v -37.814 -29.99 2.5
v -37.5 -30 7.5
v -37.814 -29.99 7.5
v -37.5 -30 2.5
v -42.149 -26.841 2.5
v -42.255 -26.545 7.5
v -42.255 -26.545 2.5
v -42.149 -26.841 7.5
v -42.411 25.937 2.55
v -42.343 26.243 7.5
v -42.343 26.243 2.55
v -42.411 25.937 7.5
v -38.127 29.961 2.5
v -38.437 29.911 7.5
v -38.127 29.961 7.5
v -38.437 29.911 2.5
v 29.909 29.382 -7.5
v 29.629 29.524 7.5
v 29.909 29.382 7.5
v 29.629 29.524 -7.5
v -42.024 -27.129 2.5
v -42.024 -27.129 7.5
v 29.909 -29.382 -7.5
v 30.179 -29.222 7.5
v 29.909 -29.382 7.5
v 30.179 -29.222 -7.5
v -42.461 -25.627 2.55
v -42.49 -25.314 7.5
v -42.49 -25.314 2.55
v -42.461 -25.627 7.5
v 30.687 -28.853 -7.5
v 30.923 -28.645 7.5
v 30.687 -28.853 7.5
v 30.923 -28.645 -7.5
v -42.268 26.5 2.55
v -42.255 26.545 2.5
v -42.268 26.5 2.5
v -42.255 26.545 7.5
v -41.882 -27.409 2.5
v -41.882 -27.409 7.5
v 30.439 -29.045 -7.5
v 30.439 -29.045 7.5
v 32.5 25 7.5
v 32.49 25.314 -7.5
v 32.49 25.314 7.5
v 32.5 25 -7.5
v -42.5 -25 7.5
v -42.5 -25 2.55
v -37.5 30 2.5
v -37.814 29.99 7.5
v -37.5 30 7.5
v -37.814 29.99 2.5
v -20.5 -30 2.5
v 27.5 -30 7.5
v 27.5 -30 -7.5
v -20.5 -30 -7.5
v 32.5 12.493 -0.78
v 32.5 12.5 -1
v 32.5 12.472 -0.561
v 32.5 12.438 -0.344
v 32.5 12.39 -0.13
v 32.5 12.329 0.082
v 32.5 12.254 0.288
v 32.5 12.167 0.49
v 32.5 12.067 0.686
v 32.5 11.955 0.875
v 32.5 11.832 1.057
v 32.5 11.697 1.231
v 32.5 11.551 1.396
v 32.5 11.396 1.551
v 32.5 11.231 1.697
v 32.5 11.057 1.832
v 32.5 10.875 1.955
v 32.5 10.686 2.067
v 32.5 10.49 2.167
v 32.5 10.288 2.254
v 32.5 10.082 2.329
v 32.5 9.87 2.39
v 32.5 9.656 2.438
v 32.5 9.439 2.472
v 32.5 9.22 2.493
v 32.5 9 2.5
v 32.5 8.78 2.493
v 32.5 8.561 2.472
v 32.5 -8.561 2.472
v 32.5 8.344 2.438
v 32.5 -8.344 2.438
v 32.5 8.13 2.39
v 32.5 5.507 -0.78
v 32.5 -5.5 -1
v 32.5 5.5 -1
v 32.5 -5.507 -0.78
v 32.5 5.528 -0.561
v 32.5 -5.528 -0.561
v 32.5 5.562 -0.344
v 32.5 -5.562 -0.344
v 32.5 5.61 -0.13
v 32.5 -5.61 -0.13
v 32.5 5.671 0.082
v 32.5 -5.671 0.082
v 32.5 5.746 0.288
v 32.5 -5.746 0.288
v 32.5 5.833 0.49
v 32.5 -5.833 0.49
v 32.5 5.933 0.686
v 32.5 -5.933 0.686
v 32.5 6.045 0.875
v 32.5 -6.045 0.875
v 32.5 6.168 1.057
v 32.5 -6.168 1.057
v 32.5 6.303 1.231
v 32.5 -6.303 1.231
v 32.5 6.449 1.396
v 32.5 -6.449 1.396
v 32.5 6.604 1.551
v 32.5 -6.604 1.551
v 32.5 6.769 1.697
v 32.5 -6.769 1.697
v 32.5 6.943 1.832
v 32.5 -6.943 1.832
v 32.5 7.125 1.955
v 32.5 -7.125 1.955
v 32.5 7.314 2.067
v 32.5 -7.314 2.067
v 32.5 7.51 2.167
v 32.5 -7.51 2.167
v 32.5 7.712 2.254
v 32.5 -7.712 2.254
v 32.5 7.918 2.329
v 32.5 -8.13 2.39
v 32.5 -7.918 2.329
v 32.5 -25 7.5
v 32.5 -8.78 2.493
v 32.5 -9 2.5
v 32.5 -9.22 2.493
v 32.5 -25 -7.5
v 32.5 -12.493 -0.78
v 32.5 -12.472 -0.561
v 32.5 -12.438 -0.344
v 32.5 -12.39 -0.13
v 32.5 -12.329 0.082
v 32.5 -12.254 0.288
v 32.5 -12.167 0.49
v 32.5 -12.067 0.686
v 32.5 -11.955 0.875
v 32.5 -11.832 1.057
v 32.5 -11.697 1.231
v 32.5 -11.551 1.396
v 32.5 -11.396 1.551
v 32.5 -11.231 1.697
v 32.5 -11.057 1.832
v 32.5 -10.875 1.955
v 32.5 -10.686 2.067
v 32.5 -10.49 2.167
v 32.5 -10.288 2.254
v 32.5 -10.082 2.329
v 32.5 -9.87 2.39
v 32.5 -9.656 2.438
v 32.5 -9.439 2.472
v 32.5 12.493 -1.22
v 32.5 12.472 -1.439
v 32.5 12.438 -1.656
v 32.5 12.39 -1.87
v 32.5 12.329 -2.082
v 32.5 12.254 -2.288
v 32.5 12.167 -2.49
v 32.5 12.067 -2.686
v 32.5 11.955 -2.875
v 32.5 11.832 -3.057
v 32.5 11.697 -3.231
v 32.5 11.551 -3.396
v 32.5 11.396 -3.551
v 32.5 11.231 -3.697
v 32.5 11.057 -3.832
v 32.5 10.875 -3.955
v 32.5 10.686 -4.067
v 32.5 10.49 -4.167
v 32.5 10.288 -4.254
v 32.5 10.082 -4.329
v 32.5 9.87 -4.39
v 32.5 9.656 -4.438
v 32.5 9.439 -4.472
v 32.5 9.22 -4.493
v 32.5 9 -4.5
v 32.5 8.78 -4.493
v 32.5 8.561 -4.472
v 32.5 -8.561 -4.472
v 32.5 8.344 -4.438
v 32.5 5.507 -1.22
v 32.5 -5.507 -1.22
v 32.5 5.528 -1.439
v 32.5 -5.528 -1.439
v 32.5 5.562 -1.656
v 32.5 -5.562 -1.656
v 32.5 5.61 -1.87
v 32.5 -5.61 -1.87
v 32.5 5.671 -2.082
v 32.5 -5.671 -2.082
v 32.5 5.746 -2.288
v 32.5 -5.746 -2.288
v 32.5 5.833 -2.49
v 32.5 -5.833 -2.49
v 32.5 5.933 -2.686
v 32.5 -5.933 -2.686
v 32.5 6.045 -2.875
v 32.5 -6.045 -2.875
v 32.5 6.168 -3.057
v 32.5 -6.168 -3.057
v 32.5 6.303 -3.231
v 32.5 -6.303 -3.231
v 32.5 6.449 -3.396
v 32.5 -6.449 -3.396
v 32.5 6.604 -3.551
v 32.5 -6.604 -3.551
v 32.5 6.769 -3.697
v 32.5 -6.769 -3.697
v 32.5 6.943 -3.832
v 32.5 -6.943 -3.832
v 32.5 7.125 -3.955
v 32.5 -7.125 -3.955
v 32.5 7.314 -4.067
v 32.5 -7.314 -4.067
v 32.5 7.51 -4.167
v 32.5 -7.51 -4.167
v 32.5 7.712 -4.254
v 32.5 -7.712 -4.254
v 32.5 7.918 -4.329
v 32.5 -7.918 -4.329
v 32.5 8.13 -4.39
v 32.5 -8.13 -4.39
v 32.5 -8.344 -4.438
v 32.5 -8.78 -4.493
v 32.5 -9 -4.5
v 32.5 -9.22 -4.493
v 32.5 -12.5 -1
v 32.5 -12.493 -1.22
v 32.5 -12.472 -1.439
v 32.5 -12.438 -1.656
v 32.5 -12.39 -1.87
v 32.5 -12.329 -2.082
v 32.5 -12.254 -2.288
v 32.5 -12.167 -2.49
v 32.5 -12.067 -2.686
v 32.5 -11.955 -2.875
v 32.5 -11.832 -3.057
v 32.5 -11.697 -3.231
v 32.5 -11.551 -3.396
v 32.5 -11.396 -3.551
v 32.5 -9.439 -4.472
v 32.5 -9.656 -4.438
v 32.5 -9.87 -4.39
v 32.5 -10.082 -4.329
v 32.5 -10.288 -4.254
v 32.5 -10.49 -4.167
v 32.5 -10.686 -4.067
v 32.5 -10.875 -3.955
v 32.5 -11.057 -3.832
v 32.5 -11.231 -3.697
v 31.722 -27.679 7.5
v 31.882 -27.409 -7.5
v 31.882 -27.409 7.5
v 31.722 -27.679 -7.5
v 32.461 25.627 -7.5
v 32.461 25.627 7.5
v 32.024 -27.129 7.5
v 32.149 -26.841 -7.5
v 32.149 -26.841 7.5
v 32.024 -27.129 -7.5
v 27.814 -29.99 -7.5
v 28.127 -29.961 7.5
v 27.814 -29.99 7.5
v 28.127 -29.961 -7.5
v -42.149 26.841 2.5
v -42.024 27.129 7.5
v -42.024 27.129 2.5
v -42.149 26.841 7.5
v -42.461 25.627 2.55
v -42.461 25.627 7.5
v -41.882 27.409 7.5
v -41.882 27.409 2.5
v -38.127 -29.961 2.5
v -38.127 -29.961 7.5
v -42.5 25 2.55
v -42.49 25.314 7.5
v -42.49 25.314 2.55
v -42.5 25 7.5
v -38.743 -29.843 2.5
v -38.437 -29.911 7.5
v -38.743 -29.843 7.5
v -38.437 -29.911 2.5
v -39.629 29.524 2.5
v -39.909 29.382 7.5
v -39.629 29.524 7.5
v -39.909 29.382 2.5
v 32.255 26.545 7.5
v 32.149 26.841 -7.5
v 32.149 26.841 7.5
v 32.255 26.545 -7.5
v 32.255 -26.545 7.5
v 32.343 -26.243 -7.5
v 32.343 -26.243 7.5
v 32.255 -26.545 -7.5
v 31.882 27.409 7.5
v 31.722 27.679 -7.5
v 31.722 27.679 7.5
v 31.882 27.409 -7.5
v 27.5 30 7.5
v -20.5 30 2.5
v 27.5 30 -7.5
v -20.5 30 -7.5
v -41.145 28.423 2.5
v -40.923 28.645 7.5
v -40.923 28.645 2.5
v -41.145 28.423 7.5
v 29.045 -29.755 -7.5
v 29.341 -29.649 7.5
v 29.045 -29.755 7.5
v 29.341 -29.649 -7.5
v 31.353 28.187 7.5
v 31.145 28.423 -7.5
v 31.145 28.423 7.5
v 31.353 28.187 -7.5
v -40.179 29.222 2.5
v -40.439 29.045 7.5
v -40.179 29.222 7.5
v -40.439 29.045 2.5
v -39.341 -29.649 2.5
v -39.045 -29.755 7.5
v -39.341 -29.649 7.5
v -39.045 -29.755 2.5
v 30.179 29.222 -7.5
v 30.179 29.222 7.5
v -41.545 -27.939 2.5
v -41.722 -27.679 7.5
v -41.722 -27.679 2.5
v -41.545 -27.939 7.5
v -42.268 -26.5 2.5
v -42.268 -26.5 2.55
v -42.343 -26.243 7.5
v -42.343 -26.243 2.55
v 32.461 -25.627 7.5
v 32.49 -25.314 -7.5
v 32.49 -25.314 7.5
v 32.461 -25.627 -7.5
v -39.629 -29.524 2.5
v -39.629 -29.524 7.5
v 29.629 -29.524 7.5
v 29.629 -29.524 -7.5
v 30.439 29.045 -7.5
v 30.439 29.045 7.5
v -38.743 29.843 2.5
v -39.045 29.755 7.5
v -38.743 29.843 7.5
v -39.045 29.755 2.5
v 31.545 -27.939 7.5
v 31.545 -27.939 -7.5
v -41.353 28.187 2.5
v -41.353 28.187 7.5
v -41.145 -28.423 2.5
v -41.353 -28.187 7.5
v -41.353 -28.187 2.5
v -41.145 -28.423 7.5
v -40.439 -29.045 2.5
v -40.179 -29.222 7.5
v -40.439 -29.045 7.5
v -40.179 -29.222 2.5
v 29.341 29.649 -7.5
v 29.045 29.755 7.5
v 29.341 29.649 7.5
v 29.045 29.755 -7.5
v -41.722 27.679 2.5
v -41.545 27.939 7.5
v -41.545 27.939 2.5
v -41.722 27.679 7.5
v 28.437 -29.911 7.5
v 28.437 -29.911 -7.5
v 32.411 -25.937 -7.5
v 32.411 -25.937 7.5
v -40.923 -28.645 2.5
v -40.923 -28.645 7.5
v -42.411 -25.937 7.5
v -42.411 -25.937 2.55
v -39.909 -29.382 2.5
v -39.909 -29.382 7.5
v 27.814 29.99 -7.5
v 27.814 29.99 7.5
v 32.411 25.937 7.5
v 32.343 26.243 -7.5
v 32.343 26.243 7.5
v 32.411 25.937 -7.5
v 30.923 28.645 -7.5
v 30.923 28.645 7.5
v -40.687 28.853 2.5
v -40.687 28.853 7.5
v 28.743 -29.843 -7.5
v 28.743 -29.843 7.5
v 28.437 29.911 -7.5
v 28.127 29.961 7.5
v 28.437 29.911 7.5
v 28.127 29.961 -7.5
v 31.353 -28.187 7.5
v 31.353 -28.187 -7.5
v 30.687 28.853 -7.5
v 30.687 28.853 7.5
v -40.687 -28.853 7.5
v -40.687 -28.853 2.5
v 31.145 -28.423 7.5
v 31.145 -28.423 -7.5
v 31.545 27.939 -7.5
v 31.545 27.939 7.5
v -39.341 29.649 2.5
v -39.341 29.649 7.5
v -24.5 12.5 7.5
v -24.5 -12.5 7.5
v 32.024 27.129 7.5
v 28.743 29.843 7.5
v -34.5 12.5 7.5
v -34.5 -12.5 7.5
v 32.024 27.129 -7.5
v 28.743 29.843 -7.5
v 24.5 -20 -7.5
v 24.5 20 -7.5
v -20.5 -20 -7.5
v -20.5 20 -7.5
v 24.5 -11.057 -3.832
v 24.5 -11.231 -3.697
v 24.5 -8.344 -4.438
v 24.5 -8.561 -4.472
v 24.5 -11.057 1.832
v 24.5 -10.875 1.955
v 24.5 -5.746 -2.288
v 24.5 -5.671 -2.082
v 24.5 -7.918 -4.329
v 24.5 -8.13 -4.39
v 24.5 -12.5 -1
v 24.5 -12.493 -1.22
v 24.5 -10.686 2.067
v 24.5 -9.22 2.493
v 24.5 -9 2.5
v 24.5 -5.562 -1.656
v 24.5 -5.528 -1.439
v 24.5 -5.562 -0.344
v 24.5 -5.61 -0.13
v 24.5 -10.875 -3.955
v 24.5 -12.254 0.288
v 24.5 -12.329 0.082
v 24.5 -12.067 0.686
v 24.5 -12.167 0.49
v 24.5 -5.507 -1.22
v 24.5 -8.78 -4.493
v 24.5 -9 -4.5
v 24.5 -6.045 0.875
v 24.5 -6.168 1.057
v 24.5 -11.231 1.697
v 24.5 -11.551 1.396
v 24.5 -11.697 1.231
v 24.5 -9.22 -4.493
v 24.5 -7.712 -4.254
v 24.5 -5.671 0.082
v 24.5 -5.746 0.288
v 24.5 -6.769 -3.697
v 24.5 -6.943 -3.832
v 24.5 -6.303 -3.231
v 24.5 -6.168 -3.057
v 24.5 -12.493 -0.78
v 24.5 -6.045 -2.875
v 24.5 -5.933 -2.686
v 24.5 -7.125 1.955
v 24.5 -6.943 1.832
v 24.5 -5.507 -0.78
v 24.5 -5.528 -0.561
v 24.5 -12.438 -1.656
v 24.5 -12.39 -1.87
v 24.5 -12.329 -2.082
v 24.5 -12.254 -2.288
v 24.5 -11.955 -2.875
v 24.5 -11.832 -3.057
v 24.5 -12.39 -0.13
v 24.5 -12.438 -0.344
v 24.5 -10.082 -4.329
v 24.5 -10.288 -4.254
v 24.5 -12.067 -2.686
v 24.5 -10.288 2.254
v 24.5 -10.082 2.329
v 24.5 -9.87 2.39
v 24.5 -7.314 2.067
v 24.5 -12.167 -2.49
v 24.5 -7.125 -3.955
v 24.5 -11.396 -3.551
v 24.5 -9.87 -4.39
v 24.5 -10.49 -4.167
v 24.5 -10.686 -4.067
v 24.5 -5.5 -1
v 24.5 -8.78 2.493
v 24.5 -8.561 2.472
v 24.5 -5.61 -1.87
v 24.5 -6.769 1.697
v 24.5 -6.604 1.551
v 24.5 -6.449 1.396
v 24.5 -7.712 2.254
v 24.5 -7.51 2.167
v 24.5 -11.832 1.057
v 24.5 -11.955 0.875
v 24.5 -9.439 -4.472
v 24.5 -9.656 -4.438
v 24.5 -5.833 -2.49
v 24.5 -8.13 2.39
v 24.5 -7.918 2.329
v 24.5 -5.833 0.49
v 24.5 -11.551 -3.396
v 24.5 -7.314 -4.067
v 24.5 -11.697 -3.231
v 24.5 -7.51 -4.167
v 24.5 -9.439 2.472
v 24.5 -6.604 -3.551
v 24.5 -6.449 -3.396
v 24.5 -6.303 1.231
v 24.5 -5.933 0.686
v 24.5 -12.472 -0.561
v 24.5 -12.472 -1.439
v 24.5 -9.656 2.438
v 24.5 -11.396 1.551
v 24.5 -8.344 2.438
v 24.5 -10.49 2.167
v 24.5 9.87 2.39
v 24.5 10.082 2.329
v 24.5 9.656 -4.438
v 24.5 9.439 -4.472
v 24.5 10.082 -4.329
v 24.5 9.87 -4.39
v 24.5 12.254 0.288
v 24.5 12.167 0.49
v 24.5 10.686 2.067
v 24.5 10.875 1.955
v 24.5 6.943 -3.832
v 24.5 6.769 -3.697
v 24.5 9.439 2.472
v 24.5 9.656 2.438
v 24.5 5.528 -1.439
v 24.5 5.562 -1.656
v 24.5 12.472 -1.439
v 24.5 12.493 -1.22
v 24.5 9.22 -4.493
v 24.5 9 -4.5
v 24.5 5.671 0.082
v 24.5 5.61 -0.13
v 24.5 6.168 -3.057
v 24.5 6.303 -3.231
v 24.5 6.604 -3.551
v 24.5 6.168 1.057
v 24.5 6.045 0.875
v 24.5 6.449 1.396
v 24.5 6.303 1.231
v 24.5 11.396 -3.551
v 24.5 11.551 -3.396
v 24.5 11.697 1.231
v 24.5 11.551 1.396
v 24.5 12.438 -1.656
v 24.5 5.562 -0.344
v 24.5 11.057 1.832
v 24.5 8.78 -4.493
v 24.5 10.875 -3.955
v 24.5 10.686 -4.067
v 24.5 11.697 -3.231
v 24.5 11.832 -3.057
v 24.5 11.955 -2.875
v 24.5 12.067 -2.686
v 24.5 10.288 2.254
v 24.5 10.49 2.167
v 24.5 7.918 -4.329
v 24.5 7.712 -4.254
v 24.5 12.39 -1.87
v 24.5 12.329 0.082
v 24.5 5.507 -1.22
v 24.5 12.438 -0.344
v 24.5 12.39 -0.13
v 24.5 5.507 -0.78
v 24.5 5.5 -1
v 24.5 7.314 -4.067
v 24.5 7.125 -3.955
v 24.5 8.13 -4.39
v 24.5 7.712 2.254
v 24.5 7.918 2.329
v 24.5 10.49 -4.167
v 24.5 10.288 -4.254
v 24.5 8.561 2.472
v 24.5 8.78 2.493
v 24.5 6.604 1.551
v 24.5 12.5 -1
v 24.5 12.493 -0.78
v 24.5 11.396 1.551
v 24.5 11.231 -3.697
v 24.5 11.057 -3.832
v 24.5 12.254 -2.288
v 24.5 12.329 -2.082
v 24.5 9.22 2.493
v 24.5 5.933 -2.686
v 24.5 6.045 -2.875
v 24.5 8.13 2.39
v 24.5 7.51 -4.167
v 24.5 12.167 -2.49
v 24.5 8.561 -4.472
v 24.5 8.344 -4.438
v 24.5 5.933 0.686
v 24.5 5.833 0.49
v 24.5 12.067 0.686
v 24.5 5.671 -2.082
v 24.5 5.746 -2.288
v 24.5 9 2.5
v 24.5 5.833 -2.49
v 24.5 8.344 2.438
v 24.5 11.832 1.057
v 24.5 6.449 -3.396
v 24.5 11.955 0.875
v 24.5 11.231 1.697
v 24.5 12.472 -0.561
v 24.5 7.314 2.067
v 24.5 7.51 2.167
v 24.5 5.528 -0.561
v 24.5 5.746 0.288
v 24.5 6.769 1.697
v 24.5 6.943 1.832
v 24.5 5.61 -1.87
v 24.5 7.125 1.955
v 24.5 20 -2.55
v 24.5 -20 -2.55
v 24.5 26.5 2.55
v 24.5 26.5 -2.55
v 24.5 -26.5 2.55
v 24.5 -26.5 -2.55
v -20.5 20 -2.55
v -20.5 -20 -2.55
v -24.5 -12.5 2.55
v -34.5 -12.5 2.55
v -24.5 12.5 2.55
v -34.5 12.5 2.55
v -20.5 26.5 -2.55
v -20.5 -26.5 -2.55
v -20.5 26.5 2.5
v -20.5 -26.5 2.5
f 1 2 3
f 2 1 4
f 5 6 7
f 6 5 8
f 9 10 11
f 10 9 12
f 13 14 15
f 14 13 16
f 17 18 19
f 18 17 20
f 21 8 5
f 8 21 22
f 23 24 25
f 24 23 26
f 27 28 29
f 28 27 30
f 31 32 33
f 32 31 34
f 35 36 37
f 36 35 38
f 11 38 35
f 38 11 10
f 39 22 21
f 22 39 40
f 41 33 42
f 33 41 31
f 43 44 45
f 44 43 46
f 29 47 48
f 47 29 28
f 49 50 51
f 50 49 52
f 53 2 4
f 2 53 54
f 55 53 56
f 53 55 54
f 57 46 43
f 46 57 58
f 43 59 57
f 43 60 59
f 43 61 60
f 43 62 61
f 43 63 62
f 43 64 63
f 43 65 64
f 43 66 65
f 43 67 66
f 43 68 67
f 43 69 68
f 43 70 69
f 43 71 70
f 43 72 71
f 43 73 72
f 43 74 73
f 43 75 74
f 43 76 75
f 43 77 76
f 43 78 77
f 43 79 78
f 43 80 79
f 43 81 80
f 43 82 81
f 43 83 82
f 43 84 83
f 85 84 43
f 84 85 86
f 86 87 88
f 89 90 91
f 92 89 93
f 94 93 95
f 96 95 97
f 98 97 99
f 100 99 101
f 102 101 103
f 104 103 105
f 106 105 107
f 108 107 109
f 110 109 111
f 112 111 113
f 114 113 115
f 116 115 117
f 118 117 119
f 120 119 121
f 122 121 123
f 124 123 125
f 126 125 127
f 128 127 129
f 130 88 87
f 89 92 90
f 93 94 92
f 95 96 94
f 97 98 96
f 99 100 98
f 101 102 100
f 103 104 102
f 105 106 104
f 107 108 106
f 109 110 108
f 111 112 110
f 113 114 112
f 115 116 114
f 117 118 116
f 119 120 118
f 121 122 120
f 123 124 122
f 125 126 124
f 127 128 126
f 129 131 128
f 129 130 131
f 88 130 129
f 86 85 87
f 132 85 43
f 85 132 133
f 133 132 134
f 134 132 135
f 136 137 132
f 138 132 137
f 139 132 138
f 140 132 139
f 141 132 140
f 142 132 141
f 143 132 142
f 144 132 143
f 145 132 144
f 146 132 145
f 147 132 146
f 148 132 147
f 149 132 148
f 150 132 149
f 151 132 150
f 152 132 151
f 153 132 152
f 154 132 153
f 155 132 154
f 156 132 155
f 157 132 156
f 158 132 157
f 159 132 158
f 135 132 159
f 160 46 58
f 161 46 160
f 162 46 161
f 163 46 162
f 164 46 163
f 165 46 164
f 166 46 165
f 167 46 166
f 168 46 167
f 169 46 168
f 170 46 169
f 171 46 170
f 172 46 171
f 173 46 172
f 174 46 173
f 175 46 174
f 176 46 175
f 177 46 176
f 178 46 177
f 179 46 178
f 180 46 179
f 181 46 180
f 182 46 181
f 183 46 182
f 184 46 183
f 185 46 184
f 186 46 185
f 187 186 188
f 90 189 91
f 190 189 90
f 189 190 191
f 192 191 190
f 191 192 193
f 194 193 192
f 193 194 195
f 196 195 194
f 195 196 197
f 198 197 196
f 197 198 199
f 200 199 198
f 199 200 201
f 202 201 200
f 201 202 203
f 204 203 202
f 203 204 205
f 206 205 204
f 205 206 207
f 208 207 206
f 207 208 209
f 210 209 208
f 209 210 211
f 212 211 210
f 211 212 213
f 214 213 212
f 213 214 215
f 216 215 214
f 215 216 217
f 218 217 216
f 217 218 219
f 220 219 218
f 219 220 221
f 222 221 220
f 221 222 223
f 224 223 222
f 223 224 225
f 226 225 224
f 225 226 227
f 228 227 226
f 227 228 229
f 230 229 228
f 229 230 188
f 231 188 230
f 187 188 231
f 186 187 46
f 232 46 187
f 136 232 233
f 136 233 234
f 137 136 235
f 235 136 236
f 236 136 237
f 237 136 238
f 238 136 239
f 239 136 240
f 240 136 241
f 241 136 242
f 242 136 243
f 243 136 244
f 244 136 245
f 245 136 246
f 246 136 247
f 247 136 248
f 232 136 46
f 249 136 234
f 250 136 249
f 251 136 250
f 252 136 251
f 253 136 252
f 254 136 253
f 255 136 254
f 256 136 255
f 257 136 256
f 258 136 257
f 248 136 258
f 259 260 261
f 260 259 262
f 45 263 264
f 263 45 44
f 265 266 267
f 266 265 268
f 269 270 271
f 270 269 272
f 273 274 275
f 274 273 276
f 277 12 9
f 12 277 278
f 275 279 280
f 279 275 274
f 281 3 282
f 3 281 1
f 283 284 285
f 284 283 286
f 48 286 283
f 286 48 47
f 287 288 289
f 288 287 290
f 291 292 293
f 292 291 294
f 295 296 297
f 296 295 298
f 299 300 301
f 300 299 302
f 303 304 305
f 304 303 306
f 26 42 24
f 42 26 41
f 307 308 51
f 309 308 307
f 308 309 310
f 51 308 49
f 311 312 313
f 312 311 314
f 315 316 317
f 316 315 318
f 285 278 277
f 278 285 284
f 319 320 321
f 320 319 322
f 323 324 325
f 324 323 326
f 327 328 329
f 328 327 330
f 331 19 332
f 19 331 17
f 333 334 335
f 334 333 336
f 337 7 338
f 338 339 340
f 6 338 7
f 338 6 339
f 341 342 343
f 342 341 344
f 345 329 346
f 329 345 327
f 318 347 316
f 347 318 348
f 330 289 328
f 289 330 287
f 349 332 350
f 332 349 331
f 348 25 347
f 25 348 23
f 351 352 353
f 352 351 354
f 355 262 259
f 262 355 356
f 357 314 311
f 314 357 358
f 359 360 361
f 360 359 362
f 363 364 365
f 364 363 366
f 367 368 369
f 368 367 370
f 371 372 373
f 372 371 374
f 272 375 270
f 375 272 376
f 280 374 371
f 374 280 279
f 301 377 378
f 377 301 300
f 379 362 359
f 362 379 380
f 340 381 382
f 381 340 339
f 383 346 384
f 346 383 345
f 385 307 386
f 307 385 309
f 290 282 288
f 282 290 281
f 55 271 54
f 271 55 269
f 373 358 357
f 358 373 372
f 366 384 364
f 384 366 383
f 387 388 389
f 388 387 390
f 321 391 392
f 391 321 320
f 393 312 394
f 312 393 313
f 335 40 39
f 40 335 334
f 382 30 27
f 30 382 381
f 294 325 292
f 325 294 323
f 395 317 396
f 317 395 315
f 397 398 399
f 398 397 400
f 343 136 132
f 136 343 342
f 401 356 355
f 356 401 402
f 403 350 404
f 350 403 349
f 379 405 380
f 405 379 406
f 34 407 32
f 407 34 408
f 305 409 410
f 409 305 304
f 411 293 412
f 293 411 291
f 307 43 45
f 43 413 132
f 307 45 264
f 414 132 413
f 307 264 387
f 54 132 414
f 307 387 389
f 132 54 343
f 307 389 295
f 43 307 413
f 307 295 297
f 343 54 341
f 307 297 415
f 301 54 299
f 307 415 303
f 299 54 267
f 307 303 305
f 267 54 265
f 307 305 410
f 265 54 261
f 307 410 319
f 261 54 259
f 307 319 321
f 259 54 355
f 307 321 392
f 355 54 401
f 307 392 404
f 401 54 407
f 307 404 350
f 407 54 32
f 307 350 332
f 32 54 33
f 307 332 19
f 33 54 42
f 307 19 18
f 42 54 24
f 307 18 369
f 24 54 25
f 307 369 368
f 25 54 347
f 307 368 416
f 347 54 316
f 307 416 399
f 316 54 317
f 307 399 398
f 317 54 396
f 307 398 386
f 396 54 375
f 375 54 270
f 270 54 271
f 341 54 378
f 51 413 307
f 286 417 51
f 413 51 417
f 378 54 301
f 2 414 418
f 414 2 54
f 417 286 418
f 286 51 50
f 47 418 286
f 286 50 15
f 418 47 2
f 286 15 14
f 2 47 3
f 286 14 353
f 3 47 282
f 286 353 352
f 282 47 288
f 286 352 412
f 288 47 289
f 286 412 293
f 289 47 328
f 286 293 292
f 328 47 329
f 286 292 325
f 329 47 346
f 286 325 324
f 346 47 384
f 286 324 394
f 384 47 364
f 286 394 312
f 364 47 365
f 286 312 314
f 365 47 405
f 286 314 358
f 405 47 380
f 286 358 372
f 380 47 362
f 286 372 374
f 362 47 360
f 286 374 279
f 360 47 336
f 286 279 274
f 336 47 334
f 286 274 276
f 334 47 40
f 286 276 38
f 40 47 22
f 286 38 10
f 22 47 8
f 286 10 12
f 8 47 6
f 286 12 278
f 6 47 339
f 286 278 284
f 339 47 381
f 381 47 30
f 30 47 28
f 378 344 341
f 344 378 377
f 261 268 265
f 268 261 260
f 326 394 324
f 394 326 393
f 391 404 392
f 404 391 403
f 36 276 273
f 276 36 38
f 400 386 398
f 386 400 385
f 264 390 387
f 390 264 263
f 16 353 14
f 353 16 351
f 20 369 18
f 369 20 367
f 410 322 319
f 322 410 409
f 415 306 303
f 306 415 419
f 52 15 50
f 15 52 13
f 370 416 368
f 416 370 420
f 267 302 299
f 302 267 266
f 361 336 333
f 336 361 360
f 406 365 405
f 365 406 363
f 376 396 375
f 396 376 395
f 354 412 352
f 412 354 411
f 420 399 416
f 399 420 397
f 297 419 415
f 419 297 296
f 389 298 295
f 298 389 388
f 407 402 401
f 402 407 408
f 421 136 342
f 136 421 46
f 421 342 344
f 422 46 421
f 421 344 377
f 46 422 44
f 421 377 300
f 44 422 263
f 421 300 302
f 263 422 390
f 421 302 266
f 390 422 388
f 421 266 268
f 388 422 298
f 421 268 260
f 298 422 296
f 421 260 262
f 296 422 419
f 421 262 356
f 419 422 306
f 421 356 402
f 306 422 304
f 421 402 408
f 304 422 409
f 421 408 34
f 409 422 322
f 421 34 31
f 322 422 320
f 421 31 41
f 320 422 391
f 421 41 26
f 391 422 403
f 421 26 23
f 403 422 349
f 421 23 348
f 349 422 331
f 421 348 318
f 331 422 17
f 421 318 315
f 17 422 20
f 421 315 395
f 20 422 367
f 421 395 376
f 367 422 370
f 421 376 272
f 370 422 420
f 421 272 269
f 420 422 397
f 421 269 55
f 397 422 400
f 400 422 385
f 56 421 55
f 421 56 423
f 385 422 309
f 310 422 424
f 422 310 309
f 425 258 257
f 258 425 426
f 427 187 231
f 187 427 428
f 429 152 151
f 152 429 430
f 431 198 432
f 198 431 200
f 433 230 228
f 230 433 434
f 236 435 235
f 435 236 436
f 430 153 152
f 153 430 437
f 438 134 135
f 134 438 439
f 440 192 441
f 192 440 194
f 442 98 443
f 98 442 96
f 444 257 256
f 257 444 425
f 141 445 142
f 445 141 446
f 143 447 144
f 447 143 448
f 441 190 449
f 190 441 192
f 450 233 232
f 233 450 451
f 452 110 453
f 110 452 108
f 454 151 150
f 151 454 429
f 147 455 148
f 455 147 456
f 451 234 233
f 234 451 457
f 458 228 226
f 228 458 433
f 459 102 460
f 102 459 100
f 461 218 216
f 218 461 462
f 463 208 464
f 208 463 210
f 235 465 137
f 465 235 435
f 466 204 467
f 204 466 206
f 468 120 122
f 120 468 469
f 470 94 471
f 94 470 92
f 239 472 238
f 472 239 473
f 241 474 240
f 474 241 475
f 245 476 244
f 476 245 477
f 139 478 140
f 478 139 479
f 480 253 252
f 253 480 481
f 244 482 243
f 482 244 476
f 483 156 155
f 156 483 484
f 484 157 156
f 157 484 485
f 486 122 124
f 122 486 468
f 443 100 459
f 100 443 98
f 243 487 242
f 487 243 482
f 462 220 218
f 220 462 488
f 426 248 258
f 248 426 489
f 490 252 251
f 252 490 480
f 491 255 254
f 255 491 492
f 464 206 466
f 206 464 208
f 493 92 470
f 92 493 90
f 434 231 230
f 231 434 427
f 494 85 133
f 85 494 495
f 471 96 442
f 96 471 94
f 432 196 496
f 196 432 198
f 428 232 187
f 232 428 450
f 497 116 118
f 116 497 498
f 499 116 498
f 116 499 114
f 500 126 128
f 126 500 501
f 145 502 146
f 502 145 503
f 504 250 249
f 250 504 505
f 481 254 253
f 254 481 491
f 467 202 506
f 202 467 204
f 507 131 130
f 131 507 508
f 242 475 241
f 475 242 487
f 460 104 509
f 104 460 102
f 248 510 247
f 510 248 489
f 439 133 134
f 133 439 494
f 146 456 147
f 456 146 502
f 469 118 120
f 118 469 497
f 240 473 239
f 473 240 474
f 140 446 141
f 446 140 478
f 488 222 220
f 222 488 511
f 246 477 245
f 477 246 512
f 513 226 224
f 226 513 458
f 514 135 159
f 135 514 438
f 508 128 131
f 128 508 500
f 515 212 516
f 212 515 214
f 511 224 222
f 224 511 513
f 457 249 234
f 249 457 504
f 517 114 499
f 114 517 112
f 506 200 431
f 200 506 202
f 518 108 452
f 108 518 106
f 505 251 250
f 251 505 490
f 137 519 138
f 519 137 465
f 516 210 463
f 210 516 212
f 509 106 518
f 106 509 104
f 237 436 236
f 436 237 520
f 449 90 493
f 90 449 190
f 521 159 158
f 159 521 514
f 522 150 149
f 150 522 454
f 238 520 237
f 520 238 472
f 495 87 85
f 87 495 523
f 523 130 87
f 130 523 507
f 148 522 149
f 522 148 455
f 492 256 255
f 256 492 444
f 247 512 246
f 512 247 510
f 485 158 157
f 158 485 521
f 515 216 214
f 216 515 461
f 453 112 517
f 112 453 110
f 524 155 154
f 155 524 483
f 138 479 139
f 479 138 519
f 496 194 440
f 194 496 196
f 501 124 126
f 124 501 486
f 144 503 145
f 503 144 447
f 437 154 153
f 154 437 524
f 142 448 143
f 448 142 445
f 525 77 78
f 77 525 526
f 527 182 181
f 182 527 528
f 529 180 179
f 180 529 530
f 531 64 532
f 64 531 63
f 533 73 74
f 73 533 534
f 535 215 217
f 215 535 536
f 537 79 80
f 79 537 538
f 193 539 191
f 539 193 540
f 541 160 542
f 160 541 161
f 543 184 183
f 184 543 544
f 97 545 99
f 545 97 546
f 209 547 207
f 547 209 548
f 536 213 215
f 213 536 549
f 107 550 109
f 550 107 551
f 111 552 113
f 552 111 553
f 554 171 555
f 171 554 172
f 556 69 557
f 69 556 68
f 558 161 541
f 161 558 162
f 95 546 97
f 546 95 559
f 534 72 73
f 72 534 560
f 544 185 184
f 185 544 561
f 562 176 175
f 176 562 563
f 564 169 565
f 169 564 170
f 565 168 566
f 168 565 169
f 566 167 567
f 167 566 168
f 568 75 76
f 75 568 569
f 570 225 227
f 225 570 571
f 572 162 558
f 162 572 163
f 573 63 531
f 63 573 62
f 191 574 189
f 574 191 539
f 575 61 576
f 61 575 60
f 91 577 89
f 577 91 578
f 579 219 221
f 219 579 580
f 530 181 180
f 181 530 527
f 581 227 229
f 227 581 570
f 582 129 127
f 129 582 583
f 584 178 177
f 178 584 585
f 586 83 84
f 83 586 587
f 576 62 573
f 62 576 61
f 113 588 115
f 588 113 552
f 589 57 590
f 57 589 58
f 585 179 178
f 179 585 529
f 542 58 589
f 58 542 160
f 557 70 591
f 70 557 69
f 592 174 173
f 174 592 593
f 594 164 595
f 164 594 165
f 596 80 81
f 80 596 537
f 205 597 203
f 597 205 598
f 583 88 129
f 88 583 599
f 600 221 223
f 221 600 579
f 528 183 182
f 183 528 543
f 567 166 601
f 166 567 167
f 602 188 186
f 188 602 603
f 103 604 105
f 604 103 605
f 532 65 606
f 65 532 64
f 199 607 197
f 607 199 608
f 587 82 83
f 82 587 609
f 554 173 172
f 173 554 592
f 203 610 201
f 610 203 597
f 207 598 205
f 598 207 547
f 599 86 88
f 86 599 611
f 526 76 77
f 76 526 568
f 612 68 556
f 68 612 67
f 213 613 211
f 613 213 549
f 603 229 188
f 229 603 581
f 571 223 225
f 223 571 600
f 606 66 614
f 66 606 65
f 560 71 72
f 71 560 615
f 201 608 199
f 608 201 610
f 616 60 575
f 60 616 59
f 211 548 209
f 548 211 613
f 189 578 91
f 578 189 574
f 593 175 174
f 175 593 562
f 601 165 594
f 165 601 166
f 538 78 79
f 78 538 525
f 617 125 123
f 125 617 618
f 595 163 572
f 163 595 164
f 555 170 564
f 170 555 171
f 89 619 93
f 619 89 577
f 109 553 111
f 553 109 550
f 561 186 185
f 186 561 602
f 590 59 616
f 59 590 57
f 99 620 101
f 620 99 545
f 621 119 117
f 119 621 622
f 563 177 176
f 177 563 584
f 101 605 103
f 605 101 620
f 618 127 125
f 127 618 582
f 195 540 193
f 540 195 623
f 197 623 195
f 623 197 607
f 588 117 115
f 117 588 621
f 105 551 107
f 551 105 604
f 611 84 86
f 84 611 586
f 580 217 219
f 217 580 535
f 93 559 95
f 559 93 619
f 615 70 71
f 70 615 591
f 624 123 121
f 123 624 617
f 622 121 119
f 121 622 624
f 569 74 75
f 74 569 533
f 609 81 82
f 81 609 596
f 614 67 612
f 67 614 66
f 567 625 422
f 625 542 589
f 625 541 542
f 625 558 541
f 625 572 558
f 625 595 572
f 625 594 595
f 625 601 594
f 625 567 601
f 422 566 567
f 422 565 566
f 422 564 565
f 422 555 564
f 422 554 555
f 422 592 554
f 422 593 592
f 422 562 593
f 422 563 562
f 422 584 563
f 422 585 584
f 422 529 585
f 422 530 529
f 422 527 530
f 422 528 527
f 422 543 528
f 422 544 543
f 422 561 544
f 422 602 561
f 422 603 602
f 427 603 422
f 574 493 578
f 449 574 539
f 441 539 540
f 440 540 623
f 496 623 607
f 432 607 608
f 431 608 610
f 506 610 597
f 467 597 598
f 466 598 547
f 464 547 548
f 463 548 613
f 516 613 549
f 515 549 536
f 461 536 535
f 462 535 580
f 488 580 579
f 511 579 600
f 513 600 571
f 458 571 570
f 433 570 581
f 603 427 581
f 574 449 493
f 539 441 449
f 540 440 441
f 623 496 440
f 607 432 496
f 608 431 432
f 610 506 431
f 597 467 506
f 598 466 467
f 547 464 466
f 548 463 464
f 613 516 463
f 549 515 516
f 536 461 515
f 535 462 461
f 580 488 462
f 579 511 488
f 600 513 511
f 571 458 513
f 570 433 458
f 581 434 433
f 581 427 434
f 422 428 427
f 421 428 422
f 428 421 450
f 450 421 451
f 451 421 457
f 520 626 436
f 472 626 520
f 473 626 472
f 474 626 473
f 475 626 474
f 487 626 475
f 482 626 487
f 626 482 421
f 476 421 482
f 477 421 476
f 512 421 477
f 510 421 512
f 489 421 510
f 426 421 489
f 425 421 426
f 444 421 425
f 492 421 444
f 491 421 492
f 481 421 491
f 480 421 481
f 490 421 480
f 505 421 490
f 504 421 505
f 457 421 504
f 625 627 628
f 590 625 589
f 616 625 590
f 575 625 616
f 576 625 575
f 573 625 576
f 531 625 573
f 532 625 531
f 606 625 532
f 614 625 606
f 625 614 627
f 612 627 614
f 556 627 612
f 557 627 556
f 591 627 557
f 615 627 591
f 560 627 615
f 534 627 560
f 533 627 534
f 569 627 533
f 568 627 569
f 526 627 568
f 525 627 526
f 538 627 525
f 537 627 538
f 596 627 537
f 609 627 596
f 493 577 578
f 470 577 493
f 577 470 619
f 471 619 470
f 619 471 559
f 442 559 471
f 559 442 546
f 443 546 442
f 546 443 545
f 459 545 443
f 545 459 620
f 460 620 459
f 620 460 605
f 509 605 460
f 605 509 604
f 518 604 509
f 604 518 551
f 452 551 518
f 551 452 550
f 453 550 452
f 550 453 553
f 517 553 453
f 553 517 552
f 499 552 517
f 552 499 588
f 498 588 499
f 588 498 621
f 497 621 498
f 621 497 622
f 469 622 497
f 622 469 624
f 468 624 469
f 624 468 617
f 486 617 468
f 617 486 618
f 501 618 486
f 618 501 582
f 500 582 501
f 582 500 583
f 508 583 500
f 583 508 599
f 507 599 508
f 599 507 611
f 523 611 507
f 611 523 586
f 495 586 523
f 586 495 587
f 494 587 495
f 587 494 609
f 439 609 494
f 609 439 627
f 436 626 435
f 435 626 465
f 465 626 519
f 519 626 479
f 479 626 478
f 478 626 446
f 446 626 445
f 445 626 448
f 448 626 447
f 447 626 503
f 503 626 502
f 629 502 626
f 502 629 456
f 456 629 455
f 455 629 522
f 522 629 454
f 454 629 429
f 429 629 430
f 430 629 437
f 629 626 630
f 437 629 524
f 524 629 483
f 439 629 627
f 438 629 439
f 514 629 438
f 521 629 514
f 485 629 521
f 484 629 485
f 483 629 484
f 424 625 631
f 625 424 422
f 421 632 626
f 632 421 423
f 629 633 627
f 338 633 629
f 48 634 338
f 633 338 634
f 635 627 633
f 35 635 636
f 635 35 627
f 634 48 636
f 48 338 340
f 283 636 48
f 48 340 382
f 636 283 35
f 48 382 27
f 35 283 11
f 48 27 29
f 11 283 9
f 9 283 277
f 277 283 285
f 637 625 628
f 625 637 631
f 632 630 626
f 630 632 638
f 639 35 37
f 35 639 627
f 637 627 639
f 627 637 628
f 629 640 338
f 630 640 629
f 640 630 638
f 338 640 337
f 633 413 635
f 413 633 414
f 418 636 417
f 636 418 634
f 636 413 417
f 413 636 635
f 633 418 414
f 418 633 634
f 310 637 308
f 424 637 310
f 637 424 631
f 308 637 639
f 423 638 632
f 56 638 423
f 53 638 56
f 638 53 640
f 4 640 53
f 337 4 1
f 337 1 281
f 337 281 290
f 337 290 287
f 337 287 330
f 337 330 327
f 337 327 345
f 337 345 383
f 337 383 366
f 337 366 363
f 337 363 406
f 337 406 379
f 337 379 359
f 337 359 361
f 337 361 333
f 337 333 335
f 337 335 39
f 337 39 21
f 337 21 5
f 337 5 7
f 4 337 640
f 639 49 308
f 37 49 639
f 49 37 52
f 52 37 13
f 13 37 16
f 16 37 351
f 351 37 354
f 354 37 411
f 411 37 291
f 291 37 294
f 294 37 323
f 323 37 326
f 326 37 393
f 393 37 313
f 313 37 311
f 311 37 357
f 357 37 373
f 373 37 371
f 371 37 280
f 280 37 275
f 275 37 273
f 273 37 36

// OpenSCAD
// file: ../roundedcube.scad
// Higher definition curves
$fs = 0.01;

module roundedcube(size = [1, 1, 1], center = false, radius = 0.5, apply_to = "all") {
	// If single value, convert to [x, y, z] vector
	size = (size[0] == undef) ? [size, size, size] : size;

	translate_min = radius;
	translate_xmax = size[0] - radius;
	translate_ymax = size[1] - radius;
	translate_zmax = size[2] - radius;

	diameter = radius * 2;

	module build_point(type = "sphere", rotate = [0, 0, 0]) {
		if (type == "sphere") {
			sphere(r = radius);
		} else if (type == "cylinder") {
			rotate(a = rotate)
			cylinder(h = diameter, r = radius, center = true);
		}
	}

	obj_translate = (center == false) ?
		[0, 0, 0] : [
			-(size[0] / 2),
			-(size[1] / 2),
			-(size[2] / 2)
		];

	translate(v = obj_translate) {
		hull() {
			for (translate_x = [translate_min, translate_xmax]) {
				x_at = (translate_x == translate_min) ? "min" : "max";
				for (translate_y = [translate_min, translate_ymax]) {
					y_at = (translate_y == translate_min) ? "min" : "max";
					for (translate_z = [translate_min, translate_zmax]) {
						z_at = (translate_z == translate_min) ? "min" : "max";

						translate(v = [translate_x, translate_y, translate_z])
						if (
							(apply_to == "all") ||
							(apply_to == "xmin" && x_at == "min") || (apply_to == "xmax" && x_at == "max") ||
							(apply_to == "ymin" && y_at == "min") || (apply_to == "ymax" && y_at == "max") ||
							(apply_to == "zmin" && z_at == "min") || (apply_to == "zmax" && z_at == "max")
						) {
							build_point("sphere");
						} else {
							rotate =
								(apply_to == "xmin" || apply_to == "xmax" || apply_to == "x") ? [0, 90, 0] : (
								(apply_to == "ymin" || apply_to == "ymax" || apply_to == "y") ? [90, 90, 0] :
								[0, 0, 0]
							);
							build_point("cylinder", rotate);
						}
					}
				}
			}
		}
	}
}

module roundedcubez(size = [1, 1, 1], center = false, radius = 0.5, apply_to = "all") {
	intersection() {
		roundedcube(size, center, radius, apply_to="z");
		scale([1.0, 1.0, 1.1])
			cube(size, center);
	}
}
// main file
$fn = $preview ? 30 : 100;

include <../roundedcube.scad>

difference() {
	translate([-5, 0, 0])
		roundedcubez(size=[75, 60, 15], center=true, radius=5);
	translate([-17.5 - 8, 0, -27.5 + 5])
		cube(size=[100, 40, 40], center=true);
	translate([-17.5 - 8, 0, 0])
		cube(size=[100, 53, 5.1], center=true);
	for (i=[-1, 1])
		translate([30, 9 * i, -1])
			rotate([0, 90, 0])
				cylinder(h=20, d=7, center=true);

	// Slot for clip
	translate([29.5 - 59, 0, 5])
		cube(size=[10, 25, 10], center=true);

	// bottom cut
	translate([19.5 - 50 - 45, 0, -7.5])
		cube(size=[10 + 100, 100, 20], center=true);
}
